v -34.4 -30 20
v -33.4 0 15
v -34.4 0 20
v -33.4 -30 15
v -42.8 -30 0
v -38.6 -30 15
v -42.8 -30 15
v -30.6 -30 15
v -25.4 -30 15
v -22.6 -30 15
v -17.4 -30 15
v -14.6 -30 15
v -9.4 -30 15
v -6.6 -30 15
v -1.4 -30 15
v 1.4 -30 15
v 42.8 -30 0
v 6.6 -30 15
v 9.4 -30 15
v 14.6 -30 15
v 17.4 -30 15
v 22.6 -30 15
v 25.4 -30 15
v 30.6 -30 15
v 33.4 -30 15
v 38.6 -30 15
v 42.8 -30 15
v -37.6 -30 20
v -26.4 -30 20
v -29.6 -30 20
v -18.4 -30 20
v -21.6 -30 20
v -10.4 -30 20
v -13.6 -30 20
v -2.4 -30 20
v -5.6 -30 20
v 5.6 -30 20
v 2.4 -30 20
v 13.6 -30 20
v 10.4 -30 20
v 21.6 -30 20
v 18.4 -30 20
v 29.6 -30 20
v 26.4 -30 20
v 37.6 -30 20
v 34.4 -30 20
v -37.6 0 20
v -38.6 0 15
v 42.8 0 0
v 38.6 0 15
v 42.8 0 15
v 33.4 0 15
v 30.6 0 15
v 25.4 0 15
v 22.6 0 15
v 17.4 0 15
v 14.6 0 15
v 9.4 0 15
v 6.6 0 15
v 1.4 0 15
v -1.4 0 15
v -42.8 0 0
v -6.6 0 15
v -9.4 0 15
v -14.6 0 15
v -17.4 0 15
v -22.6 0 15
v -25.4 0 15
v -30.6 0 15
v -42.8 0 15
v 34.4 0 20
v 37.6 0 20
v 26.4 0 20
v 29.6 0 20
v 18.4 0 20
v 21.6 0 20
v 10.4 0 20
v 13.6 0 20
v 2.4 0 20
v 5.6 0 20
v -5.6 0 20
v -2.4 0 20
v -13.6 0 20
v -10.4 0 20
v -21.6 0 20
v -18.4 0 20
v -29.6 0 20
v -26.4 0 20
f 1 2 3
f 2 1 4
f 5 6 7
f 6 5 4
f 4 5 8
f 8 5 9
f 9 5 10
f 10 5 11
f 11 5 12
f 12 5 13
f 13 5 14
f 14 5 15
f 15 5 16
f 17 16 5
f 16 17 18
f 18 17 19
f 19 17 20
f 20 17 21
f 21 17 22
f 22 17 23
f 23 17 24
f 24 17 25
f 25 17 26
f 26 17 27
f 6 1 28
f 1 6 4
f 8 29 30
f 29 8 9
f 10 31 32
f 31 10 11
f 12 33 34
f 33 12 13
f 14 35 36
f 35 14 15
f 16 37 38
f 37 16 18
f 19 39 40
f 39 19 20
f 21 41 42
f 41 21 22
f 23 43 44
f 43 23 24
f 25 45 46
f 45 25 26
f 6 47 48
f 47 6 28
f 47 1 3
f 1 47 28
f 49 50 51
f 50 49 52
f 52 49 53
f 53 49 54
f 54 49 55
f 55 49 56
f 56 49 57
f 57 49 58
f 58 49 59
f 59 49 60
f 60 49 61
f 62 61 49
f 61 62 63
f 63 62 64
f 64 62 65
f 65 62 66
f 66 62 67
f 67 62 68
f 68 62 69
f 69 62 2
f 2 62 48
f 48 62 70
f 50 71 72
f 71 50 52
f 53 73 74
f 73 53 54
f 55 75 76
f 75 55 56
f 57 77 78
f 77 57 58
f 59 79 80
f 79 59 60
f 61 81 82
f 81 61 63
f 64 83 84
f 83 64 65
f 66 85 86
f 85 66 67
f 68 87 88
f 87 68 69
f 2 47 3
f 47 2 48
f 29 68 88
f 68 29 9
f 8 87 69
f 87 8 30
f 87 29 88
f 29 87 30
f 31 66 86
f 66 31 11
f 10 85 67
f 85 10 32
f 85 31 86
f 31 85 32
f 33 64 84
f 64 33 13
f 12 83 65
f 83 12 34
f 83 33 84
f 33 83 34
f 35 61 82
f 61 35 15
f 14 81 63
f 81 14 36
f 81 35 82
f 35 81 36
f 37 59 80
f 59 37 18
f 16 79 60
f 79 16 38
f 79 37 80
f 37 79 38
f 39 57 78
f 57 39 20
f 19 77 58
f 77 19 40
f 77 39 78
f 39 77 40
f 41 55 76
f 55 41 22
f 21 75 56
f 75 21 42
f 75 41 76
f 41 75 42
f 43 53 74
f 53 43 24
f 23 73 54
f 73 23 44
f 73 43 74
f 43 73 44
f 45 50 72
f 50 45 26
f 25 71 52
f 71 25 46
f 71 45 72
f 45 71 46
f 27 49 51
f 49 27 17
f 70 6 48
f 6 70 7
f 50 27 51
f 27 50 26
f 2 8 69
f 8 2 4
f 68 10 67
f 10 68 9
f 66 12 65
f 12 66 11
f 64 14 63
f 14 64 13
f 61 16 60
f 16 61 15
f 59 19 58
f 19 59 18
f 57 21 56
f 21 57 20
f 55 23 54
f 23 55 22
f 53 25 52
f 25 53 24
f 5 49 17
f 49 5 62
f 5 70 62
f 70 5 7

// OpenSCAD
$fn = 32;

// ----------------------------------------------------------------------
// Toothed rack, 10 teeth
// 8 mm pitch, 5 mm teeth
// ----------------------------------------------------------------------

// --- parameters (mm) ---
bar_w = 30;     // bar width (Y)
bar_h = 15;     // bar height (Z)
teeth = 10;     // number of teeth
pitch = 8;      // tooth pitch
tooth_h = 5;    // tooth height above the bar
root_w = 5.6;   // tooth width at the root
crest_w = 3.2;  // tooth width at the crest

// --- derived feature positions (mm) ---
span = (teeth - 1) * pitch;  // = 72   distance between the outer teeth
bar_l = span + root_w + 8;   // = 85.6   bar length: teeth plus 4 mm at each end
tooth_x = -span / 2;         // = -36   X of the first tooth
height = bar_h + tooth_h;    // = 20   overall height
feature_centers = [
  [tooth_x + 0 * pitch, -bar_w / 2],
  [tooth_x + 1 * pitch, -bar_w / 2],
  [tooth_x + 2 * pitch, -bar_w / 2],
  [tooth_x + 3 * pitch, -bar_w / 2],
  [tooth_x + 4 * pitch, -bar_w / 2],
  [tooth_x + 5 * pitch, -bar_w / 2],
  [tooth_x + 6 * pitch, -bar_w / 2],
  [tooth_x + 7 * pitch, -bar_w / 2],
  [tooth_x + 8 * pitch, -bar_w / 2],
  [tooth_x + 9 * pitch, -bar_w / 2]
];   // tooth centre line, drives the tooth loop

// bar with a rack of teeth, one extruded trapezoium per centre
module rack_tooth() {
  linear_extrude(height = bar_w)
    polygon(points = [
      [0, 0],
      [root_w, 0],
      [root_w / 2 + crest_w / 2, tooth_h + 1],
      [root_w / 2 - crest_w / 2, tooth_h + 1]
    ]);
}

union() {
  translate([-bar_l / 2, -bar_w, 0]) cube([bar_l, bar_w, bar_h]);
  for (centre = feature_centers)
    translate([centre[0] - root_w / 2, 0, bar_h - 1]) rotate([90, 0, 0]) rack_tooth();
}
